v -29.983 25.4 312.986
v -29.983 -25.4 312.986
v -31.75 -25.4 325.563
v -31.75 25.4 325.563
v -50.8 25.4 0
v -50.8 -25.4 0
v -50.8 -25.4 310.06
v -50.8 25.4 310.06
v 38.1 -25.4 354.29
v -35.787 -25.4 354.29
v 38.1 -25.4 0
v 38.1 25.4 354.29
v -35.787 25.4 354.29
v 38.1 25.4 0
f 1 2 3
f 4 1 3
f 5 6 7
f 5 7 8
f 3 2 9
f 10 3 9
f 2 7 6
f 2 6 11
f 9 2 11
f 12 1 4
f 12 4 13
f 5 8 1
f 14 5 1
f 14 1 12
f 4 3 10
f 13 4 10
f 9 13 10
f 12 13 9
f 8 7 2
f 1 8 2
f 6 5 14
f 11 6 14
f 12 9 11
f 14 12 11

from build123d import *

# Parameters (mm, degrees)
SKETCH1_W               = 101.6
SKETCH1_H               = 50.8
BOSS_EXTRUDE1_DEPTH     = 354.289954614
CUT_EXTRUDE1_DEPTH      = 362.500555934
CUT_EXTRUDE1_DEPTH_BACK = 362.500555934
CUT_EXTRUDE2_DEPTH      = 362.500555934
CUT_EXTRUDE2_DEPTH_BACK = 362.500555934
SKETCH3_W               = 12.7
SKETCH3_H               = 354.289954614


with BuildPart() as part:
    # Sketch1 → Boss-Extrude1 (new body)
    with BuildSketch(Plane.XY):
        Rectangle(SKETCH1_W, SKETCH1_H)
    extrude(amount=BOSS_EXTRUDE1_DEPTH)

    # Sketch2 → Cut-Extrude1 (cut, two sides: drawn at the far end of the back side and taken through both)
    with BuildSketch(Plane(origin=(0, 25.4, 0), x_dir=(1, 0, 0), z_dir=(0, 1, 0)).offset(-CUT_EXTRUDE1_DEPTH_BACK)):
        Polygon((-50.8, -322.885251713), (-50.8, -310.060441542), (-29.982501618, -312.986150141), (-31.75, -325.562554614), (-35.787372775, -354.289954614), (-50.8, -354.289954614), align=None)
    extrude(amount=CUT_EXTRUDE1_DEPTH + CUT_EXTRUDE1_DEPTH_BACK, mode=Mode.SUBTRACT)

    # Sketch3 → Cut-Extrude2 (cut, two sides: drawn at the far end of the back side and taken through both)
    with BuildSketch(Plane(origin=(0, 25.4, 0), x_dir=(1, 0, 0), z_dir=(0, 1, 0)).offset(-CUT_EXTRUDE2_DEPTH_BACK)):
        with Locations((44.45, -177.144977307)):
            Rectangle(SKETCH3_W, SKETCH3_H)
    extrude(amount=CUT_EXTRUDE2_DEPTH + CUT_EXTRUDE2_DEPTH_BACK, mode=Mode.SUBTRACT)


solid = part.part
